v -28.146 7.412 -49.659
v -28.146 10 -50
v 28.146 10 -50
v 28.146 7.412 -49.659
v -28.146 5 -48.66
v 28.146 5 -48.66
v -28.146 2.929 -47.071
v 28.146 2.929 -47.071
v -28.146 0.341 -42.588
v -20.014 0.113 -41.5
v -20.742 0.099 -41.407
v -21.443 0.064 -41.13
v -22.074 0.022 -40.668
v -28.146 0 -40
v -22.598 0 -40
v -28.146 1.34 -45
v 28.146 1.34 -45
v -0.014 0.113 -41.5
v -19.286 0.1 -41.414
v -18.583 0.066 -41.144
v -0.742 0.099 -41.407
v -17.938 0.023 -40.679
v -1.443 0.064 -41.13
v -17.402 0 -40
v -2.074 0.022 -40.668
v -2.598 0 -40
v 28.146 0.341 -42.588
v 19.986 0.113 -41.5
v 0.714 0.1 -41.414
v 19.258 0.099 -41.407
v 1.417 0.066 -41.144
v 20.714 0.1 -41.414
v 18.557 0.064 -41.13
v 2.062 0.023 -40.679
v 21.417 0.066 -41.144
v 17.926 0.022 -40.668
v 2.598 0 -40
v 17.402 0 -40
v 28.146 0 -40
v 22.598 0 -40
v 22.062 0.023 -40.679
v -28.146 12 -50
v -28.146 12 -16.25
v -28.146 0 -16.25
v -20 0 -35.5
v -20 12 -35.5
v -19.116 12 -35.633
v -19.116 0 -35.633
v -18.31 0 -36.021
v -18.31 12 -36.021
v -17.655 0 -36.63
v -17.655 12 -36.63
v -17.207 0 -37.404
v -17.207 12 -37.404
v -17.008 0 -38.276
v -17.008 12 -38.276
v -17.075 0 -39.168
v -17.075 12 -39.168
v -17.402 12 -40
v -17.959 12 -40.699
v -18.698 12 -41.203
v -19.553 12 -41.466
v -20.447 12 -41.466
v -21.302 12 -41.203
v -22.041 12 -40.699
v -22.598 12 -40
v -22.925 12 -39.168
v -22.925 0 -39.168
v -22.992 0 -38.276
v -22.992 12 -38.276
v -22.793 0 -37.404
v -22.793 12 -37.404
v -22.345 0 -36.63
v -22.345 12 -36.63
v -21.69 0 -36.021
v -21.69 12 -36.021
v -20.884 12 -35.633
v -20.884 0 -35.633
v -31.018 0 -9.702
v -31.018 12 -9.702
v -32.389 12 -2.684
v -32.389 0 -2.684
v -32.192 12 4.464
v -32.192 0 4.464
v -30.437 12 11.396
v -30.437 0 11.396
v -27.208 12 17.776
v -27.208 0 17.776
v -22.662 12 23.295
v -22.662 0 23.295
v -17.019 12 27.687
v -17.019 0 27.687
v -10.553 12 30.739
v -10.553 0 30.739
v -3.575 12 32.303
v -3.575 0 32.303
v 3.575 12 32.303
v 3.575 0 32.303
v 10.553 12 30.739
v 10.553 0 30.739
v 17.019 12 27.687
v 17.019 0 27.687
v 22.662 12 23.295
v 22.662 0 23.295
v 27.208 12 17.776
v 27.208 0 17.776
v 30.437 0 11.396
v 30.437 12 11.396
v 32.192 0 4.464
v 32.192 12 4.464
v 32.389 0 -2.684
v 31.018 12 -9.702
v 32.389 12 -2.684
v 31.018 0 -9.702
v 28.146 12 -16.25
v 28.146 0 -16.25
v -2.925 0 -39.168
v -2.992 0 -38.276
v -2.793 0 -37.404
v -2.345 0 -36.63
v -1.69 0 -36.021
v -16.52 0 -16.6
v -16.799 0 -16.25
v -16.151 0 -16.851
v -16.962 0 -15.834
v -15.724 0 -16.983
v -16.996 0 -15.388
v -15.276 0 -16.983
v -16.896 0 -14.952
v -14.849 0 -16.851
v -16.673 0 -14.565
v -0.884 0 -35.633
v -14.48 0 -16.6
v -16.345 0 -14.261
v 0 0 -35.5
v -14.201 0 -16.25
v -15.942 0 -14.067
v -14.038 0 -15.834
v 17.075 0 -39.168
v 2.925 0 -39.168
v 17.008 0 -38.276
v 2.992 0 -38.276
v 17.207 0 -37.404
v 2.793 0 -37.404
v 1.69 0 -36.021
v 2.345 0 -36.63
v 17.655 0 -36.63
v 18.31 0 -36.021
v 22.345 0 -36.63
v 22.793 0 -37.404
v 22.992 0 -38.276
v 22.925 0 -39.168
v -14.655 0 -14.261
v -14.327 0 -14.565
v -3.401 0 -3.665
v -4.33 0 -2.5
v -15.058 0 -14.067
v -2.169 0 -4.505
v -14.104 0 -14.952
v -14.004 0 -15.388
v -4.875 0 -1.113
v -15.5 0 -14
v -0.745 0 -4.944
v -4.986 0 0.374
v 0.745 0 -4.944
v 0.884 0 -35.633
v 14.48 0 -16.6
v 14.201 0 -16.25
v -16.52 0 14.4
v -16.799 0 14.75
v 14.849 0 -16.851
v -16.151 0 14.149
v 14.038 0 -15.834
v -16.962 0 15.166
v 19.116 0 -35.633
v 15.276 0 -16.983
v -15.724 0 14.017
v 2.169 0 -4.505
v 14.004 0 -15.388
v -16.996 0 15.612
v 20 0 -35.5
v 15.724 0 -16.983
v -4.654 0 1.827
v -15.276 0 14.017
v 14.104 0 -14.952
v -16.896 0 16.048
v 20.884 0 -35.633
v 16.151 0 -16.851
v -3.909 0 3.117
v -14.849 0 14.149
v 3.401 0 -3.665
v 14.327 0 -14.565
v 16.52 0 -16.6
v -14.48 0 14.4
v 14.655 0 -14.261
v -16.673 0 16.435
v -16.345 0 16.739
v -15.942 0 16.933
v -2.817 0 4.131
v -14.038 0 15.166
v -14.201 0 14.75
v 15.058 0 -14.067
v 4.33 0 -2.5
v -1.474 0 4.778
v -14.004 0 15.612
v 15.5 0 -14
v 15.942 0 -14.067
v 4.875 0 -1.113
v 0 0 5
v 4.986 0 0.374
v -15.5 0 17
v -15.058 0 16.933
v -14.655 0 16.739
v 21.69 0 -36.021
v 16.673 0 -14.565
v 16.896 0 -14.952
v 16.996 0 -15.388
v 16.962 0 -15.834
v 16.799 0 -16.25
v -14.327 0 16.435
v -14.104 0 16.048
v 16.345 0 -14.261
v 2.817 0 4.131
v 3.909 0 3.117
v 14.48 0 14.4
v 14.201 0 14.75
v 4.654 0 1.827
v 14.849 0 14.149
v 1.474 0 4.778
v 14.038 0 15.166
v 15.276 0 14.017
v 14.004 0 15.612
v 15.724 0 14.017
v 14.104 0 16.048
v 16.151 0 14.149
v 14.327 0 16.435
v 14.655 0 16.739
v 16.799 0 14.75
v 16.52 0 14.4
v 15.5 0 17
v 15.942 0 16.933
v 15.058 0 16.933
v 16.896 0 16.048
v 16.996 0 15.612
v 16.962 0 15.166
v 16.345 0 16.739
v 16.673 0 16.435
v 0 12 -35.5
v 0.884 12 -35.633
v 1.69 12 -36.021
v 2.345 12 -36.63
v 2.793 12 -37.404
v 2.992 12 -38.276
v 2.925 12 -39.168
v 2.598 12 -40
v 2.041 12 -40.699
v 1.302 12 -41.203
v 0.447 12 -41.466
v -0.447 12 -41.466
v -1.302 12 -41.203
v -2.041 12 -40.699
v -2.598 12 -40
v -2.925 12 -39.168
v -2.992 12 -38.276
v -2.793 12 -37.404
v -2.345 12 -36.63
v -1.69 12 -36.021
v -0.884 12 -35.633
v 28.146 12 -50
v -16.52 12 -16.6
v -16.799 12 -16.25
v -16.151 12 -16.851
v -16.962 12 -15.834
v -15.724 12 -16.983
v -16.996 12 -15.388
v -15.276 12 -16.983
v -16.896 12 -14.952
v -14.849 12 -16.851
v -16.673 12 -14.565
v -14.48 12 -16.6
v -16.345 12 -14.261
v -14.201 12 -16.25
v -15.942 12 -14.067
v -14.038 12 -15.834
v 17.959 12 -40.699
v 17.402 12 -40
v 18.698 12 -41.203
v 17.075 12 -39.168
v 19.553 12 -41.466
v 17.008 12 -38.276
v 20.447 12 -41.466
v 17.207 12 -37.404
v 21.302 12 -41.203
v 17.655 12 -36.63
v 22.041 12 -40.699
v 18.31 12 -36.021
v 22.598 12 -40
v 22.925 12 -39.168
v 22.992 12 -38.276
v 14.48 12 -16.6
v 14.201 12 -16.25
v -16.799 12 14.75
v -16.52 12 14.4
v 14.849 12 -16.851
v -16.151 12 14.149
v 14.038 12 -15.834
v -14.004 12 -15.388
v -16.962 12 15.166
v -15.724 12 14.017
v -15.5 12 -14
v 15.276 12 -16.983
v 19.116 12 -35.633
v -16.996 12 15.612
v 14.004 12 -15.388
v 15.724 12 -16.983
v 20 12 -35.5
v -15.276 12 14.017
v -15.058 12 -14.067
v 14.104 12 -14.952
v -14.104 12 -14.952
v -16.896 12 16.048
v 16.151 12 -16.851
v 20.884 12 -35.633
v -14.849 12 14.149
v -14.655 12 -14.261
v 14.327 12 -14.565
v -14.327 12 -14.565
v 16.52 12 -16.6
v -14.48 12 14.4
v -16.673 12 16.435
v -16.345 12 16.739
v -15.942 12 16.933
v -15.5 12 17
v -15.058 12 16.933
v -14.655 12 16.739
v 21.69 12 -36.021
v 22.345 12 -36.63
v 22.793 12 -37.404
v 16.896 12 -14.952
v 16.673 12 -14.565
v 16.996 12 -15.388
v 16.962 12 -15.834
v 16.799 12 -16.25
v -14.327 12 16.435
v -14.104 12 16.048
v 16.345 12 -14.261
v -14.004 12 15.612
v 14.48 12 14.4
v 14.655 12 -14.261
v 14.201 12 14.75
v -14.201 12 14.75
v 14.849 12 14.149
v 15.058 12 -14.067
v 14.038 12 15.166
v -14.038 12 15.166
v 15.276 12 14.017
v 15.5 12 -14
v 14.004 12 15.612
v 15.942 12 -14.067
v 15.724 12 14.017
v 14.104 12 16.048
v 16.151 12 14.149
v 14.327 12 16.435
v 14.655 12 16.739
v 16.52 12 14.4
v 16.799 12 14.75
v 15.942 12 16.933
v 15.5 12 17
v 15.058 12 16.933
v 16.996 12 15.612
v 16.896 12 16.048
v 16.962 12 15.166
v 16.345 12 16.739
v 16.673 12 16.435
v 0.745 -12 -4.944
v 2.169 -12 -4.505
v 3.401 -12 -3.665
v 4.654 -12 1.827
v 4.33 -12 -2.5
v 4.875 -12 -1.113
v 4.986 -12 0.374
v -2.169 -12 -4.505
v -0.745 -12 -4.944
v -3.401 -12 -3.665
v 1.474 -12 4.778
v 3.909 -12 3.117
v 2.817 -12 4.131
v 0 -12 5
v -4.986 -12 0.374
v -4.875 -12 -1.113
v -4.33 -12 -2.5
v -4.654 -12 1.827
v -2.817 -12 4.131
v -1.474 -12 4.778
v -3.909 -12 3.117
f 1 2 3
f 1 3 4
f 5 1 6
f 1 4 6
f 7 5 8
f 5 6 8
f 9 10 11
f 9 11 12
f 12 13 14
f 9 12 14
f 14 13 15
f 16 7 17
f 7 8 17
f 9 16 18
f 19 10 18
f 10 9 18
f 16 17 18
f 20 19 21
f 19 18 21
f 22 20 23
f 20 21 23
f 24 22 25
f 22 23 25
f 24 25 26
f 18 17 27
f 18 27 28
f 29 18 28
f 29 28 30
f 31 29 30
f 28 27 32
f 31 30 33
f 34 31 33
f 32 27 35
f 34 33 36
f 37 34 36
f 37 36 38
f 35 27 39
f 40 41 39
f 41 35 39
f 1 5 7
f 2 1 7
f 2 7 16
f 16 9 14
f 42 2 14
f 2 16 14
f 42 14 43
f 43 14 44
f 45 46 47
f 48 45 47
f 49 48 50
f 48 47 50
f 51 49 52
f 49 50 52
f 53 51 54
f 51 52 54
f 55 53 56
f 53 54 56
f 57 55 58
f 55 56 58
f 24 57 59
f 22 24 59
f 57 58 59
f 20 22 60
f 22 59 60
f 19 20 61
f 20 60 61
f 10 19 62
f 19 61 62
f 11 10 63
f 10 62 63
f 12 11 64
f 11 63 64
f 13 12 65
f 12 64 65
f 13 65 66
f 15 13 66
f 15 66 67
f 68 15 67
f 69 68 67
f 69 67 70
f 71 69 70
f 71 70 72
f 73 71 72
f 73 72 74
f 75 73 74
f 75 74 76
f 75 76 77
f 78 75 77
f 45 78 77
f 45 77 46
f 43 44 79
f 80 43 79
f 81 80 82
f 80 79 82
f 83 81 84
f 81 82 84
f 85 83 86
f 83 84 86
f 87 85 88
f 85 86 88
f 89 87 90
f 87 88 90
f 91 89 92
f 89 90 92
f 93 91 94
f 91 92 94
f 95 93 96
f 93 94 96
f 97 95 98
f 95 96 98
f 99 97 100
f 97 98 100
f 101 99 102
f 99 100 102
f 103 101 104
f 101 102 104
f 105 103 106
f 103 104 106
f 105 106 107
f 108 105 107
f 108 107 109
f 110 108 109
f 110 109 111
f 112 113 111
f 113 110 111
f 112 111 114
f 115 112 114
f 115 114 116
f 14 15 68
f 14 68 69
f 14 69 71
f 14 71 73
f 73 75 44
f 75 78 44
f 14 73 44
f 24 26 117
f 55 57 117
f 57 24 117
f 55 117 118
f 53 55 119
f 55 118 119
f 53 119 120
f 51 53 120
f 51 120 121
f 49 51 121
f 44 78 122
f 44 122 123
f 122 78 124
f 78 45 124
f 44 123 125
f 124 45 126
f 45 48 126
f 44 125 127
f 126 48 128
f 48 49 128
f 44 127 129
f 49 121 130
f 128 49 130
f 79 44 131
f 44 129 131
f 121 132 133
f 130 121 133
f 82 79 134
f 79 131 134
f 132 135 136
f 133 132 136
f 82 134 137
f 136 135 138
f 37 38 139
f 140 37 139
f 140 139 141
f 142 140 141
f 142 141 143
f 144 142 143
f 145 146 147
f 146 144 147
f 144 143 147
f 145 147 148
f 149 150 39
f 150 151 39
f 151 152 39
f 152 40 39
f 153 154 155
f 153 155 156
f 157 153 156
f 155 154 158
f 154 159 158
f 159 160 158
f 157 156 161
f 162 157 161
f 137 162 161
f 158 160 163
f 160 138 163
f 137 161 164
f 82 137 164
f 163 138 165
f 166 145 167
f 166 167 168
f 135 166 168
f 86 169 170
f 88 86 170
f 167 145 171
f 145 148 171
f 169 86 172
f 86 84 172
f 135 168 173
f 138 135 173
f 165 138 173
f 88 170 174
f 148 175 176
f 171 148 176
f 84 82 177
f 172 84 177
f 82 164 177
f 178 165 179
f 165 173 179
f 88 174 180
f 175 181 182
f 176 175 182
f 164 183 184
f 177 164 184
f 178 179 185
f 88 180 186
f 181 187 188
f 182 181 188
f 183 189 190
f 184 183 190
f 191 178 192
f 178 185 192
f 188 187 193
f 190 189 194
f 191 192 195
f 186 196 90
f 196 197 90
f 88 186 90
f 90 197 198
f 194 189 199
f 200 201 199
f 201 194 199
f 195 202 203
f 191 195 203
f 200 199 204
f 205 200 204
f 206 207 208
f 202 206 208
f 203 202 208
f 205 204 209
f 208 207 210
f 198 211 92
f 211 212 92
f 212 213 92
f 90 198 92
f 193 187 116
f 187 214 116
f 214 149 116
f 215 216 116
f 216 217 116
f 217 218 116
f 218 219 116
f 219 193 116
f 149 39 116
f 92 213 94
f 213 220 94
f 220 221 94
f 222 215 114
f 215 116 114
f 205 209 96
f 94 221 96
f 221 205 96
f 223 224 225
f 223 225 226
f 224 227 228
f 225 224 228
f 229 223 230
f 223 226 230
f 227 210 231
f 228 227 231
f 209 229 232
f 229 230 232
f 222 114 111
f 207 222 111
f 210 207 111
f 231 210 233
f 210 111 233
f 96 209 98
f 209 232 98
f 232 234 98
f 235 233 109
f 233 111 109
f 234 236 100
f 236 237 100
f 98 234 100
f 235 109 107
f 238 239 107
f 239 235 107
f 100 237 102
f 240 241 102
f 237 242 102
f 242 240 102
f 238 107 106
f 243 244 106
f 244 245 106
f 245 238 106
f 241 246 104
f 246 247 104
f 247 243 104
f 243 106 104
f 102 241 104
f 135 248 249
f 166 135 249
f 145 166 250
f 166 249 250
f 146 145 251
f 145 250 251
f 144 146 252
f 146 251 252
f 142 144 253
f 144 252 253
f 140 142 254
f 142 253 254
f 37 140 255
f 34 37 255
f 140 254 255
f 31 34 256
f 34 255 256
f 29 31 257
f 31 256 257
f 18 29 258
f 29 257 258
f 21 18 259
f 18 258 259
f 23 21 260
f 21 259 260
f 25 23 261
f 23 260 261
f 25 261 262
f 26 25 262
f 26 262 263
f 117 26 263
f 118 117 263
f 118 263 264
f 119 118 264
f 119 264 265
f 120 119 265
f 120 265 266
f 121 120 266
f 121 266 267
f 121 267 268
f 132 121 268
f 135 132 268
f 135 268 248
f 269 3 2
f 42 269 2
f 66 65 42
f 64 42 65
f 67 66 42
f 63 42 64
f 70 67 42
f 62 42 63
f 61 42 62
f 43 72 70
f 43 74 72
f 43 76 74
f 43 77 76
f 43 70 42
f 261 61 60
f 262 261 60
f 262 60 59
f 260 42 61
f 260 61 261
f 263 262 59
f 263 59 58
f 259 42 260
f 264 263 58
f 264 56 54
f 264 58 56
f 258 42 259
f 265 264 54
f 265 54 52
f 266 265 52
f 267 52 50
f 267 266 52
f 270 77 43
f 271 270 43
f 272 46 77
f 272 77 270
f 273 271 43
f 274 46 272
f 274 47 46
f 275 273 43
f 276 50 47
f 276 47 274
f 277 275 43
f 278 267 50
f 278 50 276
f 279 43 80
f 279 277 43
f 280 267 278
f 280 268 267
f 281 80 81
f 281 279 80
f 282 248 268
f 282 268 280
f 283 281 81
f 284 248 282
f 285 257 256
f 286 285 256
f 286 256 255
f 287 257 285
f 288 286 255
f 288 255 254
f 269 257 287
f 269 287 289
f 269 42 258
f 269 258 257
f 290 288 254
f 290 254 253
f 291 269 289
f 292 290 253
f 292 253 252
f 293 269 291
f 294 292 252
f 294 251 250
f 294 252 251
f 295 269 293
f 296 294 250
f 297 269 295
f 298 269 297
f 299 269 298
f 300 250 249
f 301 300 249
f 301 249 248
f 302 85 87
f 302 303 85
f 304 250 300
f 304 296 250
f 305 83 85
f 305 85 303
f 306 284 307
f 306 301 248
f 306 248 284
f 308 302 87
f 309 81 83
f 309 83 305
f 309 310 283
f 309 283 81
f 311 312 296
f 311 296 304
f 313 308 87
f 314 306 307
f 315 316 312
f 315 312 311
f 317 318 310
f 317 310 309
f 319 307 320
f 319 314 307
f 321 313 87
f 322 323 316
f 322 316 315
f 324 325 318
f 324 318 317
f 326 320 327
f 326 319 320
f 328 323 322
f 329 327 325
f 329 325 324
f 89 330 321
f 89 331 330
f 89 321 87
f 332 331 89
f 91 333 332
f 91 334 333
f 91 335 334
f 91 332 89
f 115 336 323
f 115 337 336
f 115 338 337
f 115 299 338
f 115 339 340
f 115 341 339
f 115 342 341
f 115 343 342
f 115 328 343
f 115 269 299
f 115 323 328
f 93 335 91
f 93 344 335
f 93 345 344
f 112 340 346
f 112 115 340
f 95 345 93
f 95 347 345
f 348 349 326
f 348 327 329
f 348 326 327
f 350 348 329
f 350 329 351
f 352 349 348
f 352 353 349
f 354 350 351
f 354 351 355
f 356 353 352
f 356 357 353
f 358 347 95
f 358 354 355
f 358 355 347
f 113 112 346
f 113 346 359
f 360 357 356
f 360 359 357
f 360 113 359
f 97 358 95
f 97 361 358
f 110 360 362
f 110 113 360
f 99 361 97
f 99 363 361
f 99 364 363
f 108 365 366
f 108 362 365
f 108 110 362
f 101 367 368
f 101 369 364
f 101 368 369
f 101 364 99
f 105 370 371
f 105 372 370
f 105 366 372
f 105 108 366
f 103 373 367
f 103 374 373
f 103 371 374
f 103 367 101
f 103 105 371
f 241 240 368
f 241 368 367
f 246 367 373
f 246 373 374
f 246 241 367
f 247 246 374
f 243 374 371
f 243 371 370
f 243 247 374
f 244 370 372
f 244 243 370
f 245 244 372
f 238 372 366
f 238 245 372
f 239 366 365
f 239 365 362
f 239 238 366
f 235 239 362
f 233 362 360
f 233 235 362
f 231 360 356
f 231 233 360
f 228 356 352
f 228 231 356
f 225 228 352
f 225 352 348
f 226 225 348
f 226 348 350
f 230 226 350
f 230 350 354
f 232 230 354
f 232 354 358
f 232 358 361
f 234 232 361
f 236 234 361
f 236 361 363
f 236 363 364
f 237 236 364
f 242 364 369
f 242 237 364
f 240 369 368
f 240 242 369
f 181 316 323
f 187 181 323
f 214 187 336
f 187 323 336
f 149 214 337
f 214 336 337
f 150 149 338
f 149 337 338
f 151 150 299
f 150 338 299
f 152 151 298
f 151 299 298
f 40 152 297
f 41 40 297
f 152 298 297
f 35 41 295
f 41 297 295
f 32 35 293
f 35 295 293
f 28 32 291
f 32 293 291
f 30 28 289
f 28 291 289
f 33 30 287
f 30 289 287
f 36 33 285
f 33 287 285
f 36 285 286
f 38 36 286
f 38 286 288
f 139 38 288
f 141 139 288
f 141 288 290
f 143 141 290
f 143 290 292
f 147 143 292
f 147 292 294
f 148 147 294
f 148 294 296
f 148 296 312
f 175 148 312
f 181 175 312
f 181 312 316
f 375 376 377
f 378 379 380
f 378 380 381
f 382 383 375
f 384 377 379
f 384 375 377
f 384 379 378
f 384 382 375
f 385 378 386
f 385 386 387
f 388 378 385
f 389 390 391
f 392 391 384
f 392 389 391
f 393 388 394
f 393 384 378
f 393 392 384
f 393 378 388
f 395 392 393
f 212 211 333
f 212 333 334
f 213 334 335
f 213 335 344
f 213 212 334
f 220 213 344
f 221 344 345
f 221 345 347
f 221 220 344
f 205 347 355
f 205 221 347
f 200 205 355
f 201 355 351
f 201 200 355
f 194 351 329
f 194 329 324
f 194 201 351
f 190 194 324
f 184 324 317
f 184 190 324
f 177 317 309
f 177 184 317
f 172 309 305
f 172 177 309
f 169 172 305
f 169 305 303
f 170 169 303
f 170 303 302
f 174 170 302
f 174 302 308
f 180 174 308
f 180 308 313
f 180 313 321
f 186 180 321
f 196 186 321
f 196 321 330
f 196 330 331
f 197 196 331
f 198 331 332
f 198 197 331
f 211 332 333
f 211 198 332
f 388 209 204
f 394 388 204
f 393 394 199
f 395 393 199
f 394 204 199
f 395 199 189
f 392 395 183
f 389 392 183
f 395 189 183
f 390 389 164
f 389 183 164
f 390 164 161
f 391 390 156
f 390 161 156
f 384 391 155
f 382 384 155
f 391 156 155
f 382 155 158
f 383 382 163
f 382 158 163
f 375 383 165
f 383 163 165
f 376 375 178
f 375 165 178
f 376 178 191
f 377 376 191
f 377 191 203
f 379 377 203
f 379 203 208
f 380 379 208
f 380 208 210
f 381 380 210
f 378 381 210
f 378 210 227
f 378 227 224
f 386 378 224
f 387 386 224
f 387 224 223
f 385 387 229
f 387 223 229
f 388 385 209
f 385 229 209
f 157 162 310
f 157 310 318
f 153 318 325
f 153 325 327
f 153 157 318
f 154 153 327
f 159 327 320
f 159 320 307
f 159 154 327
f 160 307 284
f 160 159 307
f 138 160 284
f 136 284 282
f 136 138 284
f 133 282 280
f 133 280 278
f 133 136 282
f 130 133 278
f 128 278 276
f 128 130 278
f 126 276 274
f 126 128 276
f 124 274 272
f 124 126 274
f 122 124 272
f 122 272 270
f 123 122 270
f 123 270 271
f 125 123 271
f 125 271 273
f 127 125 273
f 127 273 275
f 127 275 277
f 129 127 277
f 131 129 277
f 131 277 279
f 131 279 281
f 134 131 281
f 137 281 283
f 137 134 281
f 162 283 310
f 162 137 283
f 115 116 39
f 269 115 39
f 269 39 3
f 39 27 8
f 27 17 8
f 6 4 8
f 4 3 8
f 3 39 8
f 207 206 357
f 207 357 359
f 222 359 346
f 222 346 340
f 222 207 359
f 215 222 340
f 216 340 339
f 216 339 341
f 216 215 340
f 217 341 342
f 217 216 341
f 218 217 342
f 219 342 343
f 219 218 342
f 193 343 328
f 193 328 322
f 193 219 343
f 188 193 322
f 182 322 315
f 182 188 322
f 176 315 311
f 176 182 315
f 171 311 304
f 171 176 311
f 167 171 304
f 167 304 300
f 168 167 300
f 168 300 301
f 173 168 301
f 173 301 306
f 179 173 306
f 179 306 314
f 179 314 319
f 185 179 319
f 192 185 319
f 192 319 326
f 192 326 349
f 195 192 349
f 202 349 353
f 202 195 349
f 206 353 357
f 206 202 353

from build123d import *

# Parameters (mm, degrees)
SKETCH_1_R          = 32.5
SKETCH_1_R_2        = 1.5
EXTRUDE_2_DEPTH     = 12
SKETCH_2_R          = 5
EXTRUDE_3_DEPTH     = 12
EXTRUDE_START       = -12
EXTRUDE_4_DEPTH     = 12
SKETCH_4_R          = 3
CUT_EXTRUDE_1_DEPTH = 12
FILLET_2_R          = 10


with BuildPart() as part:
    # 草图1 → 凸台-拉伸2 (new body)
    with BuildSketch(Plane(origin=(0, 0, 0), x_dir=(1, 0, 0), z_dir=(0, 1, 0))):
        with Locations(Location((0, 0, 0), (0, 0, 270))):
            Circle(SKETCH_1_R)
        with Locations(Location((-15.5, 15.5, 0), (0, 0, 270))):
            Circle(SKETCH_1_R_2, mode=Mode.SUBTRACT)
        with Locations(Location((15.5, 15.5, 0), (0, 0, 270))):
            Circle(SKETCH_1_R_2, mode=Mode.SUBTRACT)
        with Locations(Location((15.5, -15.5, 0), (0, 0, 270))):
            Circle(SKETCH_1_R_2, mode=Mode.SUBTRACT)
        with Locations(Location((-15.5, -15.5, 0), (0, 0, 270))):
            Circle(SKETCH_1_R_2, mode=Mode.SUBTRACT)
    extrude(amount=EXTRUDE_2_DEPTH)

    # 草图2 → 凸台-拉伸3 (add)
    with BuildSketch(Plane.XZ):
        with Locations(Location((0, 0, 0), (0, 0, 90))):
            Circle(SKETCH_2_R)
    extrude(amount=EXTRUDE_3_DEPTH)

    # 草图3 → 凸台-拉伸4 (add)
    with BuildSketch(Plane(origin=(0, 12, 0), x_dir=(1, 0, 0), z_dir=(0, 1, 0)).offset(EXTRUDE_START)):
        with BuildLine():
            Line((-28.145825623, 50), (-28.145825623, 16.25))
            ThreePointArc((-28.145825623, 16.25), (-16.25, 28.145825623), (0, 32.5))
            Line((0, 32.5), (0, 50))
            Line((0, 50), (-28.145825623, 50))
        make_face()
        with BuildLine():
            ThreePointArc((0, 32.5), (16.25, 28.145825623), (28.145825623, 16.25))
            Line((28.145825623, 16.25), (28.145825623, 50))
            Line((28.145825623, 50), (0, 50))
            Line((0, 50), (0, 32.5))
        make_face()
    extrude(amount=EXTRUDE_4_DEPTH)

    # 草图4 → 切除-拉伸1 (cut)
    with BuildSketch(Plane(origin=(0, 12, 0), x_dir=(1, 0, 0), z_dir=(0, 1, 0))):
        with Locations(Location((0, 38.5, 0), (0, 0, 270))):
            Circle(SKETCH_4_R)
        with Locations(Location((20, 38.5, 0), (0, 0, 270))):
            Circle(SKETCH_4_R)
        with Locations(Location((-20, 38.5, 0), (0, 0, 270))):
            Circle(SKETCH_4_R)
    extrude(amount=-CUT_EXTRUDE_1_DEPTH, mode=Mode.SUBTRACT)

    # 圆角2
    # the kernel refuses this fillet: 10 mm, written as the material it takes off along each edge
    with BuildSketch(Plane(origin=(53.145825623, 0, -50), x_dir=(0, 0, 1), z_dir=(-1, 0, 0))) as fillet_2_piece_1:
        with BuildLine():
            CenterArc((FILLET_2_R, FILLET_2_R), FILLET_2_R, 180, 90)
            Line((0, FILLET_2_R), (0, 0))
            Line((0, 0), (FILLET_2_R, 0))
        make_face()
    extrude(amount=106.291651246, mode=Mode.SUBTRACT)


solid = part.part
